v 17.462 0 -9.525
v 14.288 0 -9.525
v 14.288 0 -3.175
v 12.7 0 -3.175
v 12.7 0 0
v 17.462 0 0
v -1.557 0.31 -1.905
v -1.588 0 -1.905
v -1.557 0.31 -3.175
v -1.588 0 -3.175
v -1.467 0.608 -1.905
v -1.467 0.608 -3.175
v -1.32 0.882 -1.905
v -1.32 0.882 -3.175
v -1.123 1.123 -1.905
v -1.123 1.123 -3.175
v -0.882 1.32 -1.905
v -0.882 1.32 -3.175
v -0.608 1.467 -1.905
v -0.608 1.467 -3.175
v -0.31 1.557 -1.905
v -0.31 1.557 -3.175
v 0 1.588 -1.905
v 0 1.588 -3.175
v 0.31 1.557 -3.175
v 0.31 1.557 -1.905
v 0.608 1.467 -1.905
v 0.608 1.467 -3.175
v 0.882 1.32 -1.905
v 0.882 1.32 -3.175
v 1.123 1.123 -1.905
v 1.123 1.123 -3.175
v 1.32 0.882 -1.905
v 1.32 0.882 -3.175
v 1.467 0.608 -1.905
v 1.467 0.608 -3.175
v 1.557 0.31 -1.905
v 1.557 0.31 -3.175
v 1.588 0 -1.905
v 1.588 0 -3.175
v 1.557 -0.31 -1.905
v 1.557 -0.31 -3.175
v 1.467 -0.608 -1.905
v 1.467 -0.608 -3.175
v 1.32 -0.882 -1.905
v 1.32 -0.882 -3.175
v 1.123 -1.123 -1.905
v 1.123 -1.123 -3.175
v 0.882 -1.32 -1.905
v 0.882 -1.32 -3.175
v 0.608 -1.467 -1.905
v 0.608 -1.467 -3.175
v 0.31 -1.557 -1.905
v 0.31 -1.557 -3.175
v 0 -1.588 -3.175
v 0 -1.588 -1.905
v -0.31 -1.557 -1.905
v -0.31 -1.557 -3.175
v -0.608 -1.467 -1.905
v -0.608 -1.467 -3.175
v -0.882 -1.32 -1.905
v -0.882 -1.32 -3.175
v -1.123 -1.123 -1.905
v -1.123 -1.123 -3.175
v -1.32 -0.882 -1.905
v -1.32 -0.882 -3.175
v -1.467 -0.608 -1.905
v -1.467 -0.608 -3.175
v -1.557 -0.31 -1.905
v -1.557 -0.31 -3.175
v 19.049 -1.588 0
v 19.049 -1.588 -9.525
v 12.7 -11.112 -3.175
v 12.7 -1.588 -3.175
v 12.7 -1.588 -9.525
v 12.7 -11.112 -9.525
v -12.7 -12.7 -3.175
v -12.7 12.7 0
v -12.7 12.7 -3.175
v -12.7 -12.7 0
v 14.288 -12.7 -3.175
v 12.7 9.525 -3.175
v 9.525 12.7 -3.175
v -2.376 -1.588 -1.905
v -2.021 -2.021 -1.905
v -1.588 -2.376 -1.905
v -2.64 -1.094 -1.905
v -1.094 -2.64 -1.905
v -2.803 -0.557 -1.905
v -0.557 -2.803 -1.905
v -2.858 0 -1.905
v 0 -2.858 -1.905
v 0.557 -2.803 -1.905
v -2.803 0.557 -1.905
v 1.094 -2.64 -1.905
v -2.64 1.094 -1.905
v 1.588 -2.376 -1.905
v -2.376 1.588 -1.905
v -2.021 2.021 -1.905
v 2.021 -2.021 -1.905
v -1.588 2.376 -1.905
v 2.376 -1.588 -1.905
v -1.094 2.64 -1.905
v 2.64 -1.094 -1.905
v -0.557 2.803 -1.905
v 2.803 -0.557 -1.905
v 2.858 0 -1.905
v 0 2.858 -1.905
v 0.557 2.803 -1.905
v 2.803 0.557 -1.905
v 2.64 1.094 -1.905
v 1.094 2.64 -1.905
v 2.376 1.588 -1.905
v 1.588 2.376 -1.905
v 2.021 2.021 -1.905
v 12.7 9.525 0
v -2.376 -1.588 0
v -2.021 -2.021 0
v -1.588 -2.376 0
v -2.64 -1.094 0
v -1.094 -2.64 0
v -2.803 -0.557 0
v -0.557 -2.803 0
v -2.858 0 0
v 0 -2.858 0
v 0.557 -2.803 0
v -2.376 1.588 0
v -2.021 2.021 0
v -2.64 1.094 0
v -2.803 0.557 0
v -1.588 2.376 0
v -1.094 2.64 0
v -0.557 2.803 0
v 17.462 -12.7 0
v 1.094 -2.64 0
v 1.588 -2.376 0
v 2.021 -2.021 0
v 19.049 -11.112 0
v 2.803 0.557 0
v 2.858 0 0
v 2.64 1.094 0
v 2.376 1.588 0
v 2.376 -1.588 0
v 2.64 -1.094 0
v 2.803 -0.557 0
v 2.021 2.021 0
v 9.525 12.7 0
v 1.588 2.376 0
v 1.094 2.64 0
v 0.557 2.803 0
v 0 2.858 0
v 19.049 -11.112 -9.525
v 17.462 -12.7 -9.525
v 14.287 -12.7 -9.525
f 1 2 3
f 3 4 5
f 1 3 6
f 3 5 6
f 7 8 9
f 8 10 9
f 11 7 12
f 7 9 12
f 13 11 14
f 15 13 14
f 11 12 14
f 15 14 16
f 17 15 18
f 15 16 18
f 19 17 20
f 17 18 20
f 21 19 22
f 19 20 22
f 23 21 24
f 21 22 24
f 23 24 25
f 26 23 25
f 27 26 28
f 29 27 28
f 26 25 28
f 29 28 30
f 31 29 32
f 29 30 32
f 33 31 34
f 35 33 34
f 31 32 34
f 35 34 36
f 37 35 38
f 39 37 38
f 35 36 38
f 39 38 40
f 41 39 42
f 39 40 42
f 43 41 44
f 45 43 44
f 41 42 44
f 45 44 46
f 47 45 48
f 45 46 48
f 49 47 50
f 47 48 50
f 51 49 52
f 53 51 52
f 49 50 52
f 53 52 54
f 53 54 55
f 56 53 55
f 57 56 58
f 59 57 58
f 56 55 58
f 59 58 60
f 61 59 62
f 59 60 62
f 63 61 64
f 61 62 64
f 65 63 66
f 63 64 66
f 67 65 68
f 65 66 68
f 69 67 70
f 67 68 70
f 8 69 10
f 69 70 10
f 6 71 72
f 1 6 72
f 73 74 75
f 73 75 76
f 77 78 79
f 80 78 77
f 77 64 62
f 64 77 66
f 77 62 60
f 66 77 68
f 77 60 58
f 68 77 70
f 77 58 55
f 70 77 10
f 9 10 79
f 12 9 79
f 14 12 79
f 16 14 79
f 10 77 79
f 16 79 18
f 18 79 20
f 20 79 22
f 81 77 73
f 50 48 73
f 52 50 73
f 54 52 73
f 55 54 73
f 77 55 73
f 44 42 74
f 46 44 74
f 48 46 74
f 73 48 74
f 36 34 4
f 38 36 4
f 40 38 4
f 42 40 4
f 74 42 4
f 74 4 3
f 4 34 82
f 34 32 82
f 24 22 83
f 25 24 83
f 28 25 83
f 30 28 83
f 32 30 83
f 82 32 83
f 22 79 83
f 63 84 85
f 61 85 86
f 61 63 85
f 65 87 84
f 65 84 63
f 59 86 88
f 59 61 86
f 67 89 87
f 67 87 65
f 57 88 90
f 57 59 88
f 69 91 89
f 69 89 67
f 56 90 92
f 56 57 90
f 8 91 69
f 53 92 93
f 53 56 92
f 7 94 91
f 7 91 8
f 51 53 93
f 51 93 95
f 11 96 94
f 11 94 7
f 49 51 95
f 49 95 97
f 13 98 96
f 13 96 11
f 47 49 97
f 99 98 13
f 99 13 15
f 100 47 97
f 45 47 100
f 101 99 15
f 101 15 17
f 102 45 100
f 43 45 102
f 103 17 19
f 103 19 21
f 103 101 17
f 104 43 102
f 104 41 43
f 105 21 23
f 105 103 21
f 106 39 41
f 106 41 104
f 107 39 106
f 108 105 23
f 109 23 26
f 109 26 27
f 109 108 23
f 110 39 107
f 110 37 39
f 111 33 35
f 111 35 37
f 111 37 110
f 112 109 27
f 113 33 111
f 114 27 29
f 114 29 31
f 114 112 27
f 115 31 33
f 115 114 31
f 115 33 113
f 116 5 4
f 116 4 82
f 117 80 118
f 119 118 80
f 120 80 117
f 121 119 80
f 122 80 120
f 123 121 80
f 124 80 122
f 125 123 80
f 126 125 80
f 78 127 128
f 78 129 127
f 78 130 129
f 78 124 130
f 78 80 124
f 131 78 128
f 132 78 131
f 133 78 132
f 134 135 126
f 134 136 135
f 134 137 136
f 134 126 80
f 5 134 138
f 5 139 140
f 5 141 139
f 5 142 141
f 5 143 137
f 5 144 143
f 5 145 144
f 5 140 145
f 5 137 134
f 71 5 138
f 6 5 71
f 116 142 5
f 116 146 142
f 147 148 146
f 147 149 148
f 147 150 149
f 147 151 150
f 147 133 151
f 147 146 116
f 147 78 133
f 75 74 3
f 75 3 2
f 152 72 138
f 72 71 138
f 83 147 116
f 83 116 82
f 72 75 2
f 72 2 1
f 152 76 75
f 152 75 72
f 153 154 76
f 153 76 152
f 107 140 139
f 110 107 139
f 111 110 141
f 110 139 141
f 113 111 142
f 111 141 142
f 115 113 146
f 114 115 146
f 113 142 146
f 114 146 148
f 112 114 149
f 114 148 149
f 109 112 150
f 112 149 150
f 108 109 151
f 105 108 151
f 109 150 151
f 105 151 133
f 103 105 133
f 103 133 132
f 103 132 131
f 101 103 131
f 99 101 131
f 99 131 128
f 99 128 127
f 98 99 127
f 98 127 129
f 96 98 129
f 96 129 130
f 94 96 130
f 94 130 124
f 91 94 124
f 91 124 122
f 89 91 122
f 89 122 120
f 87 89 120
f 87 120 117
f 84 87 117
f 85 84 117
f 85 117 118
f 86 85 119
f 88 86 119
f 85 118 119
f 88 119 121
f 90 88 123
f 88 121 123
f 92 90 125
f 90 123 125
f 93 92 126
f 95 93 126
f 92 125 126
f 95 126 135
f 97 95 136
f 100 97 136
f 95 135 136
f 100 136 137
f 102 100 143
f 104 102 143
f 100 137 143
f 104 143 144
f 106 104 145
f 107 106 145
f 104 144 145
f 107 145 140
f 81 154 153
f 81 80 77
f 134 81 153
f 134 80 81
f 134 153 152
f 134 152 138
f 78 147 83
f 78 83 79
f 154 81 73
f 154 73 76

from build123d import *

# Parameters (mm, degrees)
F0_W           = 6.3491229296
F0_H           = 12.7
F1_DEPTH       = 3.175
F2_W           = 6.3491229296
F2_H           = 12.7
F3_DEPTH       = 6.35
F5_D           = 3.175
F5_CBORE_D     = 5.715
F5_CBORE_DEPTH = 1.905
F6_SIZE        = 3.175
F7_SIZE        = 1.5875
F8_SIZE        = 1.5875
F9_SIZE        = 1.5875
F10_SIZE       = 1.5875


with BuildPart() as f1:
    # F0 (on Top) → F1 (new body)
    with BuildSketch(Plane.XY):
        with Locations((15.8745614648, -6.35)):
            Rectangle(F0_W, F0_H)
        Polygon((12.7, 0), (12.7, 12.7), (-12.7, 12.7), (-12.7, -12.7), (12.7, -12.7), align=None)
    extrude(amount=-F1_DEPTH)

    # F2 (on face) → F3 (join)
    with BuildSketch(Plane(origin=(0, 0, -3.175), x_dir=(1, 0, 0), z_dir=(0, 0, -1))):
        with Locations((15.8745614648, 6.35)):
            Rectangle(F2_W, F2_H)
    extrude(amount=F3_DEPTH)

    # F5 (through all)
    with Locations(Plane.XY):
        with Locations((0, 0)):
            CounterBoreHole(F5_D / 2, F5_CBORE_D / 2, F5_CBORE_DEPTH)

    # F6
    f6_edges = [f1.edges().sort_by_distance(p)[0] for p in [
        (12.7, 12.7, -1.5875),
    ]]
    chamfer(f6_edges, length=F6_SIZE)

    # F7
    f7_edges = [f1.edges().sort_by_distance(p)[0] for p in [
        (19.049123, 0, -4.7625),
    ]]
    chamfer(f7_edges, length=F7_SIZE)

    # F8
    f8_edges = [f1.edges().sort_by_distance(p)[0] for p in [
        (19.049123, -12.7, -4.7625),
    ]]
    chamfer(f8_edges, length=F8_SIZE)

    # F9
    f9_edges = [f1.edges().sort_by_distance(p)[0] for p in [
        (12.7, 0, -6.35),
    ]]
    chamfer(f9_edges, length=F9_SIZE)

    # F10
    f10_edges = [f1.edges().sort_by_distance(p)[0] for p in [
        (12.7, -12.7, -6.35),
    ]]
    chamfer(f10_edges, length=F10_SIZE)


solid = f1.part
